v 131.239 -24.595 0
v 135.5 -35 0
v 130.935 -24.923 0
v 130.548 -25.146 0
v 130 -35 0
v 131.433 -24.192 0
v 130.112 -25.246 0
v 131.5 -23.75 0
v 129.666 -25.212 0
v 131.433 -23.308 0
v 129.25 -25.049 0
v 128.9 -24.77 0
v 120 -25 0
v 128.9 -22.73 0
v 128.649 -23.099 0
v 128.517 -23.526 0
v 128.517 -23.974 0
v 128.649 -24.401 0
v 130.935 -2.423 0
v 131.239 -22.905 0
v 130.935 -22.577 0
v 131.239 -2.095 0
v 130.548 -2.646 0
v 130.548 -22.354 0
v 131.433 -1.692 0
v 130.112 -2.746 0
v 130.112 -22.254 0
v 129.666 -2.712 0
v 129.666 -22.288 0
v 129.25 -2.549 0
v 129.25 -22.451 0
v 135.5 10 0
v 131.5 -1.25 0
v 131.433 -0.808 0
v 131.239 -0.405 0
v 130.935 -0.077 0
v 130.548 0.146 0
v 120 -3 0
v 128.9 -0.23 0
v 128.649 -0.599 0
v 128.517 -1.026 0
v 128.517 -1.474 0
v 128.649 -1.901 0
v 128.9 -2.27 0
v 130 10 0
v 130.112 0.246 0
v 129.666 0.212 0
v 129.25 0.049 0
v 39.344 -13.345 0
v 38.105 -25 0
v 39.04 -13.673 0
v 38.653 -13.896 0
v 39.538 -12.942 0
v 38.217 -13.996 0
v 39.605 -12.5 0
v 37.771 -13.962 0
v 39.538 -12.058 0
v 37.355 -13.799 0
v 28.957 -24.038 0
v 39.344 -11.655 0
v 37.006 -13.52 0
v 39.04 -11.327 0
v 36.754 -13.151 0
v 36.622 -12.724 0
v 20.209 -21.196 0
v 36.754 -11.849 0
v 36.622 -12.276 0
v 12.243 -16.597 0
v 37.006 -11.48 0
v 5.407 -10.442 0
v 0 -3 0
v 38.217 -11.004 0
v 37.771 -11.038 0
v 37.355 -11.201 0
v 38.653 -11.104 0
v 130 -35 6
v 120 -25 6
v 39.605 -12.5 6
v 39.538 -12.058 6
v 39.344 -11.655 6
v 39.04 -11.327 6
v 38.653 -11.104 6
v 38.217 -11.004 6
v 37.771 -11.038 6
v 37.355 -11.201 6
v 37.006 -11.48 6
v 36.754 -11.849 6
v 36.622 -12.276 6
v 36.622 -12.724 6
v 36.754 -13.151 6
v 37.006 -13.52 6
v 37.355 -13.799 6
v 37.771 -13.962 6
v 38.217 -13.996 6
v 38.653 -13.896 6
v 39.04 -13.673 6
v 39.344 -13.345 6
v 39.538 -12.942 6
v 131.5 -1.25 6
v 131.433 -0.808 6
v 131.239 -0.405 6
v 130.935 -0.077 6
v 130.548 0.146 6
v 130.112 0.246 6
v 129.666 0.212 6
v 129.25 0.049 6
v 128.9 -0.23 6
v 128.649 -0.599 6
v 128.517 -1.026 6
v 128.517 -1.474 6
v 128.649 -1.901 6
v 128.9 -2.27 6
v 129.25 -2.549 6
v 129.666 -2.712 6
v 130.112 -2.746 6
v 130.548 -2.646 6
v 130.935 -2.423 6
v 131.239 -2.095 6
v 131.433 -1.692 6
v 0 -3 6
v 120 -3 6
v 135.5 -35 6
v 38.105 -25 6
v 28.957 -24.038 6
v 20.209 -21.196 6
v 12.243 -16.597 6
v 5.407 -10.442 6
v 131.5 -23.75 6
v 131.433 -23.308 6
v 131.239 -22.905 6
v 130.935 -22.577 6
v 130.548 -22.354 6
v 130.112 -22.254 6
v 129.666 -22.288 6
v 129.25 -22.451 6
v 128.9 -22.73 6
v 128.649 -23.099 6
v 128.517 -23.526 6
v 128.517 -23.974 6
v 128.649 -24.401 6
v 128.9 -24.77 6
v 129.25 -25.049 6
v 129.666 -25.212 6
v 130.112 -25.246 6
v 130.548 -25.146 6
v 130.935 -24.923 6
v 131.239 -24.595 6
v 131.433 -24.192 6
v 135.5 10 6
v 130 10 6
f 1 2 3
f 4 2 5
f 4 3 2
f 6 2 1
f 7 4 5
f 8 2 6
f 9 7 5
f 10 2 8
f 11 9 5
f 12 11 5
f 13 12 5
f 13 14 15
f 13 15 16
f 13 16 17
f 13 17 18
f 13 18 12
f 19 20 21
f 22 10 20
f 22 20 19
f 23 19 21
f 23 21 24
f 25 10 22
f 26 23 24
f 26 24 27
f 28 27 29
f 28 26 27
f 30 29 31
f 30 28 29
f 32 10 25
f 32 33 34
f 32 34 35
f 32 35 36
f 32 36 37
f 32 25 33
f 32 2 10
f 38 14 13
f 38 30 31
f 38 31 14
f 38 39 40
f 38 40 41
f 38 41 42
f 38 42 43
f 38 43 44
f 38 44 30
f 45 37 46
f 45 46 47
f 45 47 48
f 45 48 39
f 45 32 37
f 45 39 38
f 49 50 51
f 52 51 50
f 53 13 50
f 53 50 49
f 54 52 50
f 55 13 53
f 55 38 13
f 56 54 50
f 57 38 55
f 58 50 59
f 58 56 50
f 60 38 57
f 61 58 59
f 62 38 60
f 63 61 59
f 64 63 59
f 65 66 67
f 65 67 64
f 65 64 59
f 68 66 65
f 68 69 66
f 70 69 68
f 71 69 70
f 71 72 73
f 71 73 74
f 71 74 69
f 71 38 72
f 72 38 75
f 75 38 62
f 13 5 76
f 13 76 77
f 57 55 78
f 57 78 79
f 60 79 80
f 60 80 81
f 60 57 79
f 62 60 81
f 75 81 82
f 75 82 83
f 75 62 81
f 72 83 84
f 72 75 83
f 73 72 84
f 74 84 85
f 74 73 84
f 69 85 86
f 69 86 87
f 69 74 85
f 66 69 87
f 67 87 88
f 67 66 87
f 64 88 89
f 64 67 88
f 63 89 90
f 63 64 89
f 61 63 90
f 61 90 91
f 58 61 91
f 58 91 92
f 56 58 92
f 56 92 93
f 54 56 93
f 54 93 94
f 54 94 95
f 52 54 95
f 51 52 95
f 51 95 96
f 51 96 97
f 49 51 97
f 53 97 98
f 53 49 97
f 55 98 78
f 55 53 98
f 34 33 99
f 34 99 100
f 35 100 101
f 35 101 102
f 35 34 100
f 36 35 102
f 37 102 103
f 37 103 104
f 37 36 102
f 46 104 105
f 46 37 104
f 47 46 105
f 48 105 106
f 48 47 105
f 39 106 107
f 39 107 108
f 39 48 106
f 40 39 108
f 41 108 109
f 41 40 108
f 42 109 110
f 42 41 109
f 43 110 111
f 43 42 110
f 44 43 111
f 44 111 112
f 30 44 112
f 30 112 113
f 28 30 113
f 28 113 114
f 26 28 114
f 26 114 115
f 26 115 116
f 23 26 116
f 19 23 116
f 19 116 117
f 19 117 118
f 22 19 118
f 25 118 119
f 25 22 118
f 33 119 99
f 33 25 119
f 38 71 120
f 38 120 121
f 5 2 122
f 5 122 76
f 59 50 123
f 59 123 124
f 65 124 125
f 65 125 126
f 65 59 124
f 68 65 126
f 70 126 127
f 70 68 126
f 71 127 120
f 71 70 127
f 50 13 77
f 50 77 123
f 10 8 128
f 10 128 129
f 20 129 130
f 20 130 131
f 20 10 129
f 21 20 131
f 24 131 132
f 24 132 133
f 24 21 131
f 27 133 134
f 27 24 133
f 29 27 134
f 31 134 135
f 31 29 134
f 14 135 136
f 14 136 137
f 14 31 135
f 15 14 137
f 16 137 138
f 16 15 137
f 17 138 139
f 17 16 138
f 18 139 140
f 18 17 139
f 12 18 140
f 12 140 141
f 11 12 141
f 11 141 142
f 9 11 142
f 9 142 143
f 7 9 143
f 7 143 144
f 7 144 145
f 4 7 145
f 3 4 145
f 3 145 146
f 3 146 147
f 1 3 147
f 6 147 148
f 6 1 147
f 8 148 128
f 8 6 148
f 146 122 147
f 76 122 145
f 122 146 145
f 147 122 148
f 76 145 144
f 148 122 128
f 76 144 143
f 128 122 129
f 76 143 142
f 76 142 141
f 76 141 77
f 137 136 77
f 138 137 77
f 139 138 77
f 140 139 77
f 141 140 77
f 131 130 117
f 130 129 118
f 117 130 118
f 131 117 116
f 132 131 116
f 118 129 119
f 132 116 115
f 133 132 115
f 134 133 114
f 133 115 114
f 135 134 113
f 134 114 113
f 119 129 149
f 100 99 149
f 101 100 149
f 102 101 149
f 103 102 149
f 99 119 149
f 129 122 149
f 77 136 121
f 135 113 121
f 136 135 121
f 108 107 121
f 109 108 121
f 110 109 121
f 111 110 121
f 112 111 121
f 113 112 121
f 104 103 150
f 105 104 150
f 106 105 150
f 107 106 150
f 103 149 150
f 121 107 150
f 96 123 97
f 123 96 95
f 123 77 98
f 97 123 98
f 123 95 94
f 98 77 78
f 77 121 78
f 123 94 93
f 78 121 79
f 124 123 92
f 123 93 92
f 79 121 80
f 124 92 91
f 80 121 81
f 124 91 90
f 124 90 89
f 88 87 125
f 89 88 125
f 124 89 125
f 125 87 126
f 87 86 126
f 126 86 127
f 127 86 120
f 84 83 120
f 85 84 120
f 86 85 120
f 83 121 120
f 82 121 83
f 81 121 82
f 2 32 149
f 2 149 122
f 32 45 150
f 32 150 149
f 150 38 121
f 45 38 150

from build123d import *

# Parameters (mm, degrees)
SKETCH1_R           = 1.5
BOSS_EXTRUDE1_DEPTH = 6


with BuildPart() as part:
    # Sketch1 → Boss-Extrude1 (new body)
    with BuildSketch(Plane.XY):
        with BuildLine():
            Line((0, -3), (120, -3))
            Line((120, -3), (130, 10))
            Line((130, 10), (135.5, 10))
            Line((135.5, 10), (135.5, -35))
            Line((135.5, -35), (130, -35))
            Line((130, -35), (120, -25))
            Line((120, -25), (38.105117767, -25))
            ThreePointArc((38.105117767, -25), (16.105117767, -19.105117767), (0, -3))
        make_face()
        with Locations((130, -1.25)):
            Circle(SKETCH1_R, mode=Mode.SUBTRACT)
        with Locations((130, -23.75)):
            Circle(SKETCH1_R, mode=Mode.SUBTRACT)
        with Locations((38.105117767, -12.5)):
            Circle(SKETCH1_R, mode=Mode.SUBTRACT)
    extrude(amount=BOSS_EXTRUDE1_DEPTH)


solid = part.part
